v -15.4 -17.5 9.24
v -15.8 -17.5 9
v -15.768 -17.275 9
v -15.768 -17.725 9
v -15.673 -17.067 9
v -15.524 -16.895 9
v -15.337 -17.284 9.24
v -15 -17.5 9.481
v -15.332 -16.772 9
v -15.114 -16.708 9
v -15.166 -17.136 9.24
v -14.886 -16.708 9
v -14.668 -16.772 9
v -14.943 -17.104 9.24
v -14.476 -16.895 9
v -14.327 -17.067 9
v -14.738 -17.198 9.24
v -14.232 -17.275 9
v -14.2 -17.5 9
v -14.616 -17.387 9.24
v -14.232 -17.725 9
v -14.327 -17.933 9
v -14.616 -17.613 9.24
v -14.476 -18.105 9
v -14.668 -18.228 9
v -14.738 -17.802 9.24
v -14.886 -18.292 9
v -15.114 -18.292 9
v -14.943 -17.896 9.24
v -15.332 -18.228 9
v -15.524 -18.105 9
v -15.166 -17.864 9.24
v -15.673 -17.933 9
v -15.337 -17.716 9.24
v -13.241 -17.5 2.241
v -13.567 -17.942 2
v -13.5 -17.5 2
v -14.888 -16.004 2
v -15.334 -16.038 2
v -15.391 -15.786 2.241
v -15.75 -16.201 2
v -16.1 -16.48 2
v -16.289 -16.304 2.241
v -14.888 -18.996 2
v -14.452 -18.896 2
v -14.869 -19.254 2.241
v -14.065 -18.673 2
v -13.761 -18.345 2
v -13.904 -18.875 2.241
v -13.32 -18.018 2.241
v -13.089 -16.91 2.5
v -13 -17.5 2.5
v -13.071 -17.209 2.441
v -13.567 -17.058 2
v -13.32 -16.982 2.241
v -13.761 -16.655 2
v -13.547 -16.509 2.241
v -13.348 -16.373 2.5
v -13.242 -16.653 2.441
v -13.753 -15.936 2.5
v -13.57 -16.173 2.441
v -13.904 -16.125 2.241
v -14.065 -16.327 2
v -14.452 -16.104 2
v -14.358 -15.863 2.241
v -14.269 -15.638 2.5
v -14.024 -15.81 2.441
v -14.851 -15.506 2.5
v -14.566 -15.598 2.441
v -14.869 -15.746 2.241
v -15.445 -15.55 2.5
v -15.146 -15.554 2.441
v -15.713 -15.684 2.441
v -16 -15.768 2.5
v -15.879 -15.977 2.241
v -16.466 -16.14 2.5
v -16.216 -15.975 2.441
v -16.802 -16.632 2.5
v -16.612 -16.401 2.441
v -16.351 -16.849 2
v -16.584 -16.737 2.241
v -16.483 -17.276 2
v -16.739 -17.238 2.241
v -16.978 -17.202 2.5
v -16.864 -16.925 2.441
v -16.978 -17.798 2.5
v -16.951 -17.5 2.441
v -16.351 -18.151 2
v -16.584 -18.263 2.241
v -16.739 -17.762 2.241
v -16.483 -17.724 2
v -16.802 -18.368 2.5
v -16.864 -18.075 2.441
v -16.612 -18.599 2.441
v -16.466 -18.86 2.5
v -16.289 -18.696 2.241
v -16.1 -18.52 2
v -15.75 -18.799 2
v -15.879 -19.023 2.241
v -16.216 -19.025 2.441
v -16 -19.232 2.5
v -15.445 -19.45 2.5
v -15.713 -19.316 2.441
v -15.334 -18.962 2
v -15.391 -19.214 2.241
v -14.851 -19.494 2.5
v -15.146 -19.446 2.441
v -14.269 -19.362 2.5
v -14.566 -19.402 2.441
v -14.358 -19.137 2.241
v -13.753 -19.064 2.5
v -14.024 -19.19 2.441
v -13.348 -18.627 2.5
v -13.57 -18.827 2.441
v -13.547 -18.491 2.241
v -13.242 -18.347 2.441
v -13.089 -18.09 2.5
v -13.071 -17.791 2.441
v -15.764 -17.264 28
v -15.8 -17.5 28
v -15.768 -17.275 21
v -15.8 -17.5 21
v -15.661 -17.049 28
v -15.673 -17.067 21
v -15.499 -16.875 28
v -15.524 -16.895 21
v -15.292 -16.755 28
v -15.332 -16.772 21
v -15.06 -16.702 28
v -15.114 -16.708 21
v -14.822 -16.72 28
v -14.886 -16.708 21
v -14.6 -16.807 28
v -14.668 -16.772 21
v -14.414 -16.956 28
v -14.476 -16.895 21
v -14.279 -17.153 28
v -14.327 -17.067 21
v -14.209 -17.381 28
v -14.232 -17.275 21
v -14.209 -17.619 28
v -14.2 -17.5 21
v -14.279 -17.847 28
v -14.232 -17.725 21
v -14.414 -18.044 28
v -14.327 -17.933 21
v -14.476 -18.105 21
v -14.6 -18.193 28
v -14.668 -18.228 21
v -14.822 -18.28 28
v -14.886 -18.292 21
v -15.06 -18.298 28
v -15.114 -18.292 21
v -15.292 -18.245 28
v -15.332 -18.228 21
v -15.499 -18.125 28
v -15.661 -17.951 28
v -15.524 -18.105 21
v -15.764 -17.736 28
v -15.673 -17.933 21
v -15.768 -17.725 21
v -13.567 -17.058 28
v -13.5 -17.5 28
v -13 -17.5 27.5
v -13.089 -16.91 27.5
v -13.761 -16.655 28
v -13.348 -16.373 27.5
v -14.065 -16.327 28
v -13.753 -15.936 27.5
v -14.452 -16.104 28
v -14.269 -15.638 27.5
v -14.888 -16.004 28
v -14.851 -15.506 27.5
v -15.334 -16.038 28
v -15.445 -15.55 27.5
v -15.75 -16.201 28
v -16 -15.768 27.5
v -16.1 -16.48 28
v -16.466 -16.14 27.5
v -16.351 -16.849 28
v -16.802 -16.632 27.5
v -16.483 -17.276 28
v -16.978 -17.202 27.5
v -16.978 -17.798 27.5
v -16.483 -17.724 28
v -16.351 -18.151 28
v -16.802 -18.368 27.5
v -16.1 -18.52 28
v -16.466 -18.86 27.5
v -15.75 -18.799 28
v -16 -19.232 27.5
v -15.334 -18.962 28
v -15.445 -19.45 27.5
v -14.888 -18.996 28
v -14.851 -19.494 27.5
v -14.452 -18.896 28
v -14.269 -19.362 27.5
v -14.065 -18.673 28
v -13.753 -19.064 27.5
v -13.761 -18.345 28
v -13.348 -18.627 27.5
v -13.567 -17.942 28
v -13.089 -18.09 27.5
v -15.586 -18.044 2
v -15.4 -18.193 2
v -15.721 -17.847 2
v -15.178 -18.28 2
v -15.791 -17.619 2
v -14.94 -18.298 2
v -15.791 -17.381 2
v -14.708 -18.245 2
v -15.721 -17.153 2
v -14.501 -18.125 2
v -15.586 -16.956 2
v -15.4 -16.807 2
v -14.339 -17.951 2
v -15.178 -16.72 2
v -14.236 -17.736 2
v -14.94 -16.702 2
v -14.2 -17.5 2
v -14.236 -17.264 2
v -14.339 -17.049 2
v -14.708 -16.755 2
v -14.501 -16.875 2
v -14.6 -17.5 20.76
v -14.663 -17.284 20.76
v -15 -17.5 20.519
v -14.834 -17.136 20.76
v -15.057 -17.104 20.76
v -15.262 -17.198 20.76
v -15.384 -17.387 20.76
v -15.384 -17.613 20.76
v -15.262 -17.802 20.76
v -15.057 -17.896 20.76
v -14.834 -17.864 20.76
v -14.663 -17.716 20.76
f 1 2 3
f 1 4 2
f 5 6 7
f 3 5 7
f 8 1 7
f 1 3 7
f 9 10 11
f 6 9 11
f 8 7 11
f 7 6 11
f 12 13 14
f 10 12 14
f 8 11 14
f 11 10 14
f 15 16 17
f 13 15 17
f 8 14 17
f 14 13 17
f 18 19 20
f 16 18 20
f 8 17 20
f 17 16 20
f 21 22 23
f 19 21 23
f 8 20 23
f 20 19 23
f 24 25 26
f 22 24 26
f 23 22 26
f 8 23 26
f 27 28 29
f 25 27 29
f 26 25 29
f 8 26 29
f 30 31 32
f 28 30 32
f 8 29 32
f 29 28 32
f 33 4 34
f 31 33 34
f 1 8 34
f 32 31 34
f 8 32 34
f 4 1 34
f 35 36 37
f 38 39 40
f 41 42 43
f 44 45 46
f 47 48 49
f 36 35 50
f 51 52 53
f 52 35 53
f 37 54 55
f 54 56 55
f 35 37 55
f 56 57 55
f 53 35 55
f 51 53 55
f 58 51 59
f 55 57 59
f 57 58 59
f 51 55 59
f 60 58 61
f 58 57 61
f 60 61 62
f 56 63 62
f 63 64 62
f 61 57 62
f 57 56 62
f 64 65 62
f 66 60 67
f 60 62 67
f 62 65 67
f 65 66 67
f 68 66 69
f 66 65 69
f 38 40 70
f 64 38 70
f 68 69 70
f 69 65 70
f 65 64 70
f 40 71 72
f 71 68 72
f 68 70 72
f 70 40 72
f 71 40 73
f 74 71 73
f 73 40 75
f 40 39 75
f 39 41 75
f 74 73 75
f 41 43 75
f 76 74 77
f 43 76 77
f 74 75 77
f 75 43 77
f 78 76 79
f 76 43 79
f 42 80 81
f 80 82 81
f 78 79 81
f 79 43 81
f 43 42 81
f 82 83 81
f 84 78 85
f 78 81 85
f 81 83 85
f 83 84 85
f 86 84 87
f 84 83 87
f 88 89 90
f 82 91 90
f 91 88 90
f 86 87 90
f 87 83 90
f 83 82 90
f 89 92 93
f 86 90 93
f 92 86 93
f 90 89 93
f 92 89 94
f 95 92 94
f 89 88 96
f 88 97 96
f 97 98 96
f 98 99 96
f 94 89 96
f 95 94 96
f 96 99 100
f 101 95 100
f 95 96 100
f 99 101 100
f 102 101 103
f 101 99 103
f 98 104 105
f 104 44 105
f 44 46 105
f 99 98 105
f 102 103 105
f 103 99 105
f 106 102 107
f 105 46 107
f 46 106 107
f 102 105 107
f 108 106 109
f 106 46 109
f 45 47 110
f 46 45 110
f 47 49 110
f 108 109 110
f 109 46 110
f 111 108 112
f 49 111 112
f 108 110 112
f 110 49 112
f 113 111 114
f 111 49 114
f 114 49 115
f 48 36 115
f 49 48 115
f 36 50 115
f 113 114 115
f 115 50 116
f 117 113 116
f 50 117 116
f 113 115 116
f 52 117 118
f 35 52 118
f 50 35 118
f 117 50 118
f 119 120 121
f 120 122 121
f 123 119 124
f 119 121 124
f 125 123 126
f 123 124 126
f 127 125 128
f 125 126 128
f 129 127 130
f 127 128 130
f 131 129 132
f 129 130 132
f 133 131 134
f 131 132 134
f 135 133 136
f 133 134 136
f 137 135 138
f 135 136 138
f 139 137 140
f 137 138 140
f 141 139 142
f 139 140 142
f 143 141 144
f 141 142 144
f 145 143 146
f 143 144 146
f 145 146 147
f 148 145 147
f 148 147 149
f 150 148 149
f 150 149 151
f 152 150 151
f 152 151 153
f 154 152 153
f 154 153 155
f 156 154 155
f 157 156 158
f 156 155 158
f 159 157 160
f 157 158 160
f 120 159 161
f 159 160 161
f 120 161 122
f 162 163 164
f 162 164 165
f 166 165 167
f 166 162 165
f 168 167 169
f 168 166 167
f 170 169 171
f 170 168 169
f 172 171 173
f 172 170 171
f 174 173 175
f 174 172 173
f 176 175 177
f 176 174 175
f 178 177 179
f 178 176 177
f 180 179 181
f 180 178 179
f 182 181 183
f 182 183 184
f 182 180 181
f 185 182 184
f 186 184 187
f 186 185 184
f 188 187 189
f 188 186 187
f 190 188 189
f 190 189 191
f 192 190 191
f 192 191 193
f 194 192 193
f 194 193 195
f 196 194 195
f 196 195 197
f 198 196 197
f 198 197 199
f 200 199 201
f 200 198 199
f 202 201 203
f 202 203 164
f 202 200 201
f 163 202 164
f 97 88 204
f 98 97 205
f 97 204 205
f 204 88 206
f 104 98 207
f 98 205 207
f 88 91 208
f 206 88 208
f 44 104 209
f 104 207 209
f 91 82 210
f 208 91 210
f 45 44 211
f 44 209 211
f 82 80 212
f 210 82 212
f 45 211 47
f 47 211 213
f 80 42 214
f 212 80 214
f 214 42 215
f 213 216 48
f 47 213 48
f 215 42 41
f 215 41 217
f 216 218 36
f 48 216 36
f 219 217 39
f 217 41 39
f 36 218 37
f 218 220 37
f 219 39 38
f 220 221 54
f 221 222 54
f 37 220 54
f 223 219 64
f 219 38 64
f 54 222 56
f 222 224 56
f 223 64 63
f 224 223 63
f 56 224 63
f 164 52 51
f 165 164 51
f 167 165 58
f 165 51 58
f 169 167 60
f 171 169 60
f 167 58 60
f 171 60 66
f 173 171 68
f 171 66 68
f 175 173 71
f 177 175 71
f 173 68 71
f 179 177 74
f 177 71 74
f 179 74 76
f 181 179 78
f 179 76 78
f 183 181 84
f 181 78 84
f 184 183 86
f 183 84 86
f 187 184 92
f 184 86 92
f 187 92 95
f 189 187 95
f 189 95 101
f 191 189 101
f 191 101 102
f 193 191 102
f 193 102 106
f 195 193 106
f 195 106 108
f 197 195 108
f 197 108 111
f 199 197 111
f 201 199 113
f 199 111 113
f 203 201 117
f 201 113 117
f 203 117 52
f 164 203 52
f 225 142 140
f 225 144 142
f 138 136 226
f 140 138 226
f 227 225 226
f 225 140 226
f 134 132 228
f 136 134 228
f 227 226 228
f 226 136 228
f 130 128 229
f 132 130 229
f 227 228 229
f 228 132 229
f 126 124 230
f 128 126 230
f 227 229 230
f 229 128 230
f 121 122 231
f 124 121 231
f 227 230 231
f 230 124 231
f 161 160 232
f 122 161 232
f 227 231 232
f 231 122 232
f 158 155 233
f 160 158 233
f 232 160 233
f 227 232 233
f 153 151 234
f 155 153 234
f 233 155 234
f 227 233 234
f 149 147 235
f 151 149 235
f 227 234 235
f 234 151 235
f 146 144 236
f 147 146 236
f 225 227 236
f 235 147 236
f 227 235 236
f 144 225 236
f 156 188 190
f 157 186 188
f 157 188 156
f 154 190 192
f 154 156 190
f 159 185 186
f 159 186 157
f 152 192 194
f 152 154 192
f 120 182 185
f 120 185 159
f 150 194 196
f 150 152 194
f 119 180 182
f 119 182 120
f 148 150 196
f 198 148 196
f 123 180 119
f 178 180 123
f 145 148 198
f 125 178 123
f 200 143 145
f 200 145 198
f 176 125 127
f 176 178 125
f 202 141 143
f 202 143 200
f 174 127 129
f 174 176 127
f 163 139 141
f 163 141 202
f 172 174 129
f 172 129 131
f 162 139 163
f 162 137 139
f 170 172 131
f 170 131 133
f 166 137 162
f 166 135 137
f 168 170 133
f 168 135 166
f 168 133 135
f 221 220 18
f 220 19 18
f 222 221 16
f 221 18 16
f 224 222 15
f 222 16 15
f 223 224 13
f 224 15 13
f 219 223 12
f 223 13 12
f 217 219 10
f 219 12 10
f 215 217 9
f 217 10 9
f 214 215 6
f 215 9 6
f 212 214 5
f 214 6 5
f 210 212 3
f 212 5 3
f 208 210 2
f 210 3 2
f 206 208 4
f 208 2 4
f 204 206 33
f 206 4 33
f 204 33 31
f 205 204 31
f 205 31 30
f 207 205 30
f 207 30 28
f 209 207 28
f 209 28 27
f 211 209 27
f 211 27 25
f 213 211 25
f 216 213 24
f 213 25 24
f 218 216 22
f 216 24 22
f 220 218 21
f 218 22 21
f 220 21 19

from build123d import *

# Parameters (mm, degrees)
SKETCH_2_W             = 38
SKETCH_2_H             = 39
EXTRUDE_1_DEPTH        = 2
CHAMFER_3_SIZE         = 1
SKETCH_7_R             = 4.25
CUT_EXTRUDE_3_DEPTH    = 10
SKETCH_8_W             = 2
SKETCH_8_H             = 39
CUT_EXTRUDE_4_DEPTH    = 10
FILLET_3_R             = 2
SKETCH_9_R             = 2
EXTRUDE_1_2_DEPTH      = 26
SKETCH_10_W            = 3
SKETCH_10_H            = 39
CUT_EXTRUDE_1_DEPTH    = 10
FILLET_5_R             = 2
CHAMFER_5_SIZE         = 0.5
HOLE_WIZARD_M2_5_3_D   = 2.05
HOLE_WIZARD_M2_1_D     = 1.6
HOLE_WIZARD_M2_1_DEPTH = 7
HOLE_WIZARD_M2_1_TIP   = 0.480688495
CUT_EXTRUDE_2_DEPTH    = 10
SKETCH_24_W            = 71.290640242
SKETCH_24_H            = 51.144653494
CUT_EXTRUDE_3_2_DEPTH  = 10
SKETCH_25_R            = 6.539265834
CUT_EXTRUDE_4_2_DEPTH  = 32
HOLE_WIZARD_M2_2_D     = 1.6
HOLE_WIZARD_M2_2_DEPTH = 7
HOLE_WIZARD_M2_2_TIP   = 0.480688495
FILLET_6_SIZE          = 0.5


with BuildPart() as part:
    # 草图2 → Extrude 1 (new body)
    with BuildSketch(Plane.XY):
        Rectangle(SKETCH_2_W, SKETCH_2_H)
    extrude(amount=EXTRUDE_1_DEPTH)

    # 倒角3
    chamfer_3_edges = [part.edges().sort_by_distance(p)[0] for p in [
        (-19, 19.5, 1),
        (-19, -19.5, 1),
    ]]
    chamfer(chamfer_3_edges, length=CHAMFER_3_SIZE)

    # 草图7 → Cut-Extrude 3 (cut)
    with BuildSketch(Plane.XY.offset(2)):
        with Locations((2, 0)):
            Circle(SKETCH_7_R)
    extrude(amount=-CUT_EXTRUDE_3_DEPTH, mode=Mode.SUBTRACT)

    # 草图8 → Cut-Extrude 4 (cut)
    with BuildSketch(Plane.XY.offset(2)):
        with Locations((-18, 0)):
            Rectangle(SKETCH_8_W, SKETCH_8_H)
    extrude(amount=-CUT_EXTRUDE_4_DEPTH, mode=Mode.SUBTRACT)

    # 圆角3
    fillet_3_edges = [part.edges().sort_by_distance(p)[0] for p in [
        (-17, 19.5, 1),
        (-17, -19.5, 1),
    ]]
    fillet(fillet_3_edges, radius=FILLET_3_R)

    # 草图9 → Extrude 1 2 (add)
    with BuildSketch(Plane.XY.offset(2)):
        with Locations((-15, 17.5)):
            Circle(SKETCH_9_R)
        with Locations((-15, -17.5)):
            Circle(SKETCH_9_R)
    extrude_1_2 = extrude(amount=EXTRUDE_1_2_DEPTH)

    # 镜向1: Extrude 1 2 across plane
    add(extrude_1_2.mirror(Plane.ZX))

    # 草图10 → 切除-拉伸1 (cut)
    with BuildSketch(Plane(origin=(0, 0, 0), x_dir=(-1, 0, 0), z_dir=(0, 0, -1))):
        with Locations((-17.5, 0)):
            Rectangle(SKETCH_10_W, SKETCH_10_H)
    extrude(amount=-CUT_EXTRUDE_1_DEPTH, mode=Mode.SUBTRACT)

    # 圆角5
    fillet_5_edges = [part.edges().sort_by_distance(p)[0] for p in [
        (16, -19.5, 1),
        (16, 19.5, 1),
    ]]
    fillet(fillet_5_edges, radius=FILLET_5_R)

    # 倒角5
    chamfer_5_edges = [part.edges().sort_by_distance(p)[0] for p in [
        (-17, -17.5, 28),
        (-17, 17.5, 28),
        (15.414213562, 18.914213562, 0),
        (16, 0, 0),
        (-0.5, 19.5, 0),
        (15.414213562, -18.914213562, 0),
        (-16.414213562, 18.914213562, 0),
        (-0.5, -19.5, 0),
        (-17, 0, 0),
        (-16.414213562, -18.914213562, 0),
    ]]
    chamfer(chamfer_5_edges, length=CHAMFER_5_SIZE)

    # M2.5 螺纹孔3 (through all)
    with Locations(Plane(origin=(9.5, 15.5, 0), x_dir=(-1, 0, 0), z_dir=(0, 0, -1))):
        with Locations((0, 0), (15, 0), (0, -31), (15, -31)):
            Hole(HOLE_WIZARD_M2_5_3_D / 2)

    # M2 螺纹孔1
    with Locations(Plane(origin=(-15, 17.5, 28), x_dir=(1, 0, 0), z_dir=(0, 0, 1))):
        with Locations((0, 0), (0, -35)):
            Hole(HOLE_WIZARD_M2_1_D / 2, depth=HOLE_WIZARD_M2_1_DEPTH)
            with Locations((0, 0, -(HOLE_WIZARD_M2_1_DEPTH + HOLE_WIZARD_M2_1_TIP / 2))):  # 118° drill point
                Cone(0, HOLE_WIZARD_M2_1_D / 2, HOLE_WIZARD_M2_1_TIP, mode=Mode.SUBTRACT)

    # 草图23 → 切除-拉伸2 (cut)
    with BuildSketch(Plane(origin=(0, 0, 0), x_dir=(-1, 0, 0), z_dir=(0, 0, -1))):
        with BuildLine():
            Line((-0.95, 16.2), (-0.95, 9.8))
            ThreePointArc((-0.95, 9.8), (-2, 8.75), (-3.05, 9.8))
            Line((-3.05, 9.8), (-3.05, 16.2))
            ThreePointArc((-3.05, 16.2), (-2, 17.25), (-0.95, 16.2))
        make_face()
    cut_extrude_2 = extrude(amount=-CUT_EXTRUDE_2_DEPTH, mode=Mode.SUBTRACT)

    # 镜向2: 切除-拉伸2 across plane
    add(cut_extrude_2.mirror(Plane.ZX), mode=Mode.SUBTRACT)

    # 草图24 → Cut-Extrude 3 2 (cut)
    with BuildSketch(Plane.XY.offset(2)):
        Rectangle(SKETCH_24_W, SKETCH_24_H)
    extrude(amount=-CUT_EXTRUDE_3_2_DEPTH, mode=Mode.SUBTRACT)


with BuildPart() as cut_extrude_3_2_piece_1:
    # of the separate pieces the step leaves, piece 1, a body of its own (cut_extrude_3_2_pieces)
    add(part.part.solids().sort_by_distance((-13, 17.5, 27.5))[0])

    # 草图25 → Cut-Extrude 4 2 (cut)
    with BuildSketch(Plane(origin=(0, 0, 2), x_dir=(-1, 0, 0), z_dir=(0, 0, -1))):
        with Locations((15, 17.5)):
            Circle(SKETCH_25_R)
    extrude(amount=-CUT_EXTRUDE_4_2_DEPTH, mode=Mode.SUBTRACT)


with BuildPart() as cut_extrude_3_2_piece_2:
    # of the separate pieces the step leaves, piece 2, a body of its own (cut_extrude_3_2_pieces)
    add(part.part.solids().sort_by_distance((-13, -17.5, 2))[0])

    # M2 螺纹孔2
    with Locations(Plane(origin=(-15, -17.5, 2), x_dir=(-1, 0, 0), z_dir=(0, 0, -1))):
        with Locations((0, 0)):
            Hole(HOLE_WIZARD_M2_2_D / 2, depth=HOLE_WIZARD_M2_2_DEPTH)
            with Locations((0, 0, -(HOLE_WIZARD_M2_2_DEPTH + HOLE_WIZARD_M2_2_TIP / 2))):  # 118° drill point
                Cone(0, HOLE_WIZARD_M2_2_D / 2, HOLE_WIZARD_M2_2_TIP, mode=Mode.SUBTRACT)

    # 圆角6
    # a fillet whose section is not a circle: 0.5 mm, written as the material it takes off along each edge
    with BuildSketch(Plane(origin=(-15, -17.5, 2), x_dir=(1, 0, 0), z_dir=(0, -1, 0))) as fillet_6_piece_1:
        with BuildLine():
            Bezier((2, FILLET_6_SIZE), (2, 0), (2 - FILLET_6_SIZE, 0), weights=[1, 0.035355339, 1])
            Line((2 - FILLET_6_SIZE, 0), (2, 0))
            Line((2, 0), (2, FILLET_6_SIZE))
        make_face()
    revolve(axis=Axis((-15, -17.5, 2), (0, 0, 1)), mode=Mode.SUBTRACT)


solid = cut_extrude_3_2_piece_2.part
